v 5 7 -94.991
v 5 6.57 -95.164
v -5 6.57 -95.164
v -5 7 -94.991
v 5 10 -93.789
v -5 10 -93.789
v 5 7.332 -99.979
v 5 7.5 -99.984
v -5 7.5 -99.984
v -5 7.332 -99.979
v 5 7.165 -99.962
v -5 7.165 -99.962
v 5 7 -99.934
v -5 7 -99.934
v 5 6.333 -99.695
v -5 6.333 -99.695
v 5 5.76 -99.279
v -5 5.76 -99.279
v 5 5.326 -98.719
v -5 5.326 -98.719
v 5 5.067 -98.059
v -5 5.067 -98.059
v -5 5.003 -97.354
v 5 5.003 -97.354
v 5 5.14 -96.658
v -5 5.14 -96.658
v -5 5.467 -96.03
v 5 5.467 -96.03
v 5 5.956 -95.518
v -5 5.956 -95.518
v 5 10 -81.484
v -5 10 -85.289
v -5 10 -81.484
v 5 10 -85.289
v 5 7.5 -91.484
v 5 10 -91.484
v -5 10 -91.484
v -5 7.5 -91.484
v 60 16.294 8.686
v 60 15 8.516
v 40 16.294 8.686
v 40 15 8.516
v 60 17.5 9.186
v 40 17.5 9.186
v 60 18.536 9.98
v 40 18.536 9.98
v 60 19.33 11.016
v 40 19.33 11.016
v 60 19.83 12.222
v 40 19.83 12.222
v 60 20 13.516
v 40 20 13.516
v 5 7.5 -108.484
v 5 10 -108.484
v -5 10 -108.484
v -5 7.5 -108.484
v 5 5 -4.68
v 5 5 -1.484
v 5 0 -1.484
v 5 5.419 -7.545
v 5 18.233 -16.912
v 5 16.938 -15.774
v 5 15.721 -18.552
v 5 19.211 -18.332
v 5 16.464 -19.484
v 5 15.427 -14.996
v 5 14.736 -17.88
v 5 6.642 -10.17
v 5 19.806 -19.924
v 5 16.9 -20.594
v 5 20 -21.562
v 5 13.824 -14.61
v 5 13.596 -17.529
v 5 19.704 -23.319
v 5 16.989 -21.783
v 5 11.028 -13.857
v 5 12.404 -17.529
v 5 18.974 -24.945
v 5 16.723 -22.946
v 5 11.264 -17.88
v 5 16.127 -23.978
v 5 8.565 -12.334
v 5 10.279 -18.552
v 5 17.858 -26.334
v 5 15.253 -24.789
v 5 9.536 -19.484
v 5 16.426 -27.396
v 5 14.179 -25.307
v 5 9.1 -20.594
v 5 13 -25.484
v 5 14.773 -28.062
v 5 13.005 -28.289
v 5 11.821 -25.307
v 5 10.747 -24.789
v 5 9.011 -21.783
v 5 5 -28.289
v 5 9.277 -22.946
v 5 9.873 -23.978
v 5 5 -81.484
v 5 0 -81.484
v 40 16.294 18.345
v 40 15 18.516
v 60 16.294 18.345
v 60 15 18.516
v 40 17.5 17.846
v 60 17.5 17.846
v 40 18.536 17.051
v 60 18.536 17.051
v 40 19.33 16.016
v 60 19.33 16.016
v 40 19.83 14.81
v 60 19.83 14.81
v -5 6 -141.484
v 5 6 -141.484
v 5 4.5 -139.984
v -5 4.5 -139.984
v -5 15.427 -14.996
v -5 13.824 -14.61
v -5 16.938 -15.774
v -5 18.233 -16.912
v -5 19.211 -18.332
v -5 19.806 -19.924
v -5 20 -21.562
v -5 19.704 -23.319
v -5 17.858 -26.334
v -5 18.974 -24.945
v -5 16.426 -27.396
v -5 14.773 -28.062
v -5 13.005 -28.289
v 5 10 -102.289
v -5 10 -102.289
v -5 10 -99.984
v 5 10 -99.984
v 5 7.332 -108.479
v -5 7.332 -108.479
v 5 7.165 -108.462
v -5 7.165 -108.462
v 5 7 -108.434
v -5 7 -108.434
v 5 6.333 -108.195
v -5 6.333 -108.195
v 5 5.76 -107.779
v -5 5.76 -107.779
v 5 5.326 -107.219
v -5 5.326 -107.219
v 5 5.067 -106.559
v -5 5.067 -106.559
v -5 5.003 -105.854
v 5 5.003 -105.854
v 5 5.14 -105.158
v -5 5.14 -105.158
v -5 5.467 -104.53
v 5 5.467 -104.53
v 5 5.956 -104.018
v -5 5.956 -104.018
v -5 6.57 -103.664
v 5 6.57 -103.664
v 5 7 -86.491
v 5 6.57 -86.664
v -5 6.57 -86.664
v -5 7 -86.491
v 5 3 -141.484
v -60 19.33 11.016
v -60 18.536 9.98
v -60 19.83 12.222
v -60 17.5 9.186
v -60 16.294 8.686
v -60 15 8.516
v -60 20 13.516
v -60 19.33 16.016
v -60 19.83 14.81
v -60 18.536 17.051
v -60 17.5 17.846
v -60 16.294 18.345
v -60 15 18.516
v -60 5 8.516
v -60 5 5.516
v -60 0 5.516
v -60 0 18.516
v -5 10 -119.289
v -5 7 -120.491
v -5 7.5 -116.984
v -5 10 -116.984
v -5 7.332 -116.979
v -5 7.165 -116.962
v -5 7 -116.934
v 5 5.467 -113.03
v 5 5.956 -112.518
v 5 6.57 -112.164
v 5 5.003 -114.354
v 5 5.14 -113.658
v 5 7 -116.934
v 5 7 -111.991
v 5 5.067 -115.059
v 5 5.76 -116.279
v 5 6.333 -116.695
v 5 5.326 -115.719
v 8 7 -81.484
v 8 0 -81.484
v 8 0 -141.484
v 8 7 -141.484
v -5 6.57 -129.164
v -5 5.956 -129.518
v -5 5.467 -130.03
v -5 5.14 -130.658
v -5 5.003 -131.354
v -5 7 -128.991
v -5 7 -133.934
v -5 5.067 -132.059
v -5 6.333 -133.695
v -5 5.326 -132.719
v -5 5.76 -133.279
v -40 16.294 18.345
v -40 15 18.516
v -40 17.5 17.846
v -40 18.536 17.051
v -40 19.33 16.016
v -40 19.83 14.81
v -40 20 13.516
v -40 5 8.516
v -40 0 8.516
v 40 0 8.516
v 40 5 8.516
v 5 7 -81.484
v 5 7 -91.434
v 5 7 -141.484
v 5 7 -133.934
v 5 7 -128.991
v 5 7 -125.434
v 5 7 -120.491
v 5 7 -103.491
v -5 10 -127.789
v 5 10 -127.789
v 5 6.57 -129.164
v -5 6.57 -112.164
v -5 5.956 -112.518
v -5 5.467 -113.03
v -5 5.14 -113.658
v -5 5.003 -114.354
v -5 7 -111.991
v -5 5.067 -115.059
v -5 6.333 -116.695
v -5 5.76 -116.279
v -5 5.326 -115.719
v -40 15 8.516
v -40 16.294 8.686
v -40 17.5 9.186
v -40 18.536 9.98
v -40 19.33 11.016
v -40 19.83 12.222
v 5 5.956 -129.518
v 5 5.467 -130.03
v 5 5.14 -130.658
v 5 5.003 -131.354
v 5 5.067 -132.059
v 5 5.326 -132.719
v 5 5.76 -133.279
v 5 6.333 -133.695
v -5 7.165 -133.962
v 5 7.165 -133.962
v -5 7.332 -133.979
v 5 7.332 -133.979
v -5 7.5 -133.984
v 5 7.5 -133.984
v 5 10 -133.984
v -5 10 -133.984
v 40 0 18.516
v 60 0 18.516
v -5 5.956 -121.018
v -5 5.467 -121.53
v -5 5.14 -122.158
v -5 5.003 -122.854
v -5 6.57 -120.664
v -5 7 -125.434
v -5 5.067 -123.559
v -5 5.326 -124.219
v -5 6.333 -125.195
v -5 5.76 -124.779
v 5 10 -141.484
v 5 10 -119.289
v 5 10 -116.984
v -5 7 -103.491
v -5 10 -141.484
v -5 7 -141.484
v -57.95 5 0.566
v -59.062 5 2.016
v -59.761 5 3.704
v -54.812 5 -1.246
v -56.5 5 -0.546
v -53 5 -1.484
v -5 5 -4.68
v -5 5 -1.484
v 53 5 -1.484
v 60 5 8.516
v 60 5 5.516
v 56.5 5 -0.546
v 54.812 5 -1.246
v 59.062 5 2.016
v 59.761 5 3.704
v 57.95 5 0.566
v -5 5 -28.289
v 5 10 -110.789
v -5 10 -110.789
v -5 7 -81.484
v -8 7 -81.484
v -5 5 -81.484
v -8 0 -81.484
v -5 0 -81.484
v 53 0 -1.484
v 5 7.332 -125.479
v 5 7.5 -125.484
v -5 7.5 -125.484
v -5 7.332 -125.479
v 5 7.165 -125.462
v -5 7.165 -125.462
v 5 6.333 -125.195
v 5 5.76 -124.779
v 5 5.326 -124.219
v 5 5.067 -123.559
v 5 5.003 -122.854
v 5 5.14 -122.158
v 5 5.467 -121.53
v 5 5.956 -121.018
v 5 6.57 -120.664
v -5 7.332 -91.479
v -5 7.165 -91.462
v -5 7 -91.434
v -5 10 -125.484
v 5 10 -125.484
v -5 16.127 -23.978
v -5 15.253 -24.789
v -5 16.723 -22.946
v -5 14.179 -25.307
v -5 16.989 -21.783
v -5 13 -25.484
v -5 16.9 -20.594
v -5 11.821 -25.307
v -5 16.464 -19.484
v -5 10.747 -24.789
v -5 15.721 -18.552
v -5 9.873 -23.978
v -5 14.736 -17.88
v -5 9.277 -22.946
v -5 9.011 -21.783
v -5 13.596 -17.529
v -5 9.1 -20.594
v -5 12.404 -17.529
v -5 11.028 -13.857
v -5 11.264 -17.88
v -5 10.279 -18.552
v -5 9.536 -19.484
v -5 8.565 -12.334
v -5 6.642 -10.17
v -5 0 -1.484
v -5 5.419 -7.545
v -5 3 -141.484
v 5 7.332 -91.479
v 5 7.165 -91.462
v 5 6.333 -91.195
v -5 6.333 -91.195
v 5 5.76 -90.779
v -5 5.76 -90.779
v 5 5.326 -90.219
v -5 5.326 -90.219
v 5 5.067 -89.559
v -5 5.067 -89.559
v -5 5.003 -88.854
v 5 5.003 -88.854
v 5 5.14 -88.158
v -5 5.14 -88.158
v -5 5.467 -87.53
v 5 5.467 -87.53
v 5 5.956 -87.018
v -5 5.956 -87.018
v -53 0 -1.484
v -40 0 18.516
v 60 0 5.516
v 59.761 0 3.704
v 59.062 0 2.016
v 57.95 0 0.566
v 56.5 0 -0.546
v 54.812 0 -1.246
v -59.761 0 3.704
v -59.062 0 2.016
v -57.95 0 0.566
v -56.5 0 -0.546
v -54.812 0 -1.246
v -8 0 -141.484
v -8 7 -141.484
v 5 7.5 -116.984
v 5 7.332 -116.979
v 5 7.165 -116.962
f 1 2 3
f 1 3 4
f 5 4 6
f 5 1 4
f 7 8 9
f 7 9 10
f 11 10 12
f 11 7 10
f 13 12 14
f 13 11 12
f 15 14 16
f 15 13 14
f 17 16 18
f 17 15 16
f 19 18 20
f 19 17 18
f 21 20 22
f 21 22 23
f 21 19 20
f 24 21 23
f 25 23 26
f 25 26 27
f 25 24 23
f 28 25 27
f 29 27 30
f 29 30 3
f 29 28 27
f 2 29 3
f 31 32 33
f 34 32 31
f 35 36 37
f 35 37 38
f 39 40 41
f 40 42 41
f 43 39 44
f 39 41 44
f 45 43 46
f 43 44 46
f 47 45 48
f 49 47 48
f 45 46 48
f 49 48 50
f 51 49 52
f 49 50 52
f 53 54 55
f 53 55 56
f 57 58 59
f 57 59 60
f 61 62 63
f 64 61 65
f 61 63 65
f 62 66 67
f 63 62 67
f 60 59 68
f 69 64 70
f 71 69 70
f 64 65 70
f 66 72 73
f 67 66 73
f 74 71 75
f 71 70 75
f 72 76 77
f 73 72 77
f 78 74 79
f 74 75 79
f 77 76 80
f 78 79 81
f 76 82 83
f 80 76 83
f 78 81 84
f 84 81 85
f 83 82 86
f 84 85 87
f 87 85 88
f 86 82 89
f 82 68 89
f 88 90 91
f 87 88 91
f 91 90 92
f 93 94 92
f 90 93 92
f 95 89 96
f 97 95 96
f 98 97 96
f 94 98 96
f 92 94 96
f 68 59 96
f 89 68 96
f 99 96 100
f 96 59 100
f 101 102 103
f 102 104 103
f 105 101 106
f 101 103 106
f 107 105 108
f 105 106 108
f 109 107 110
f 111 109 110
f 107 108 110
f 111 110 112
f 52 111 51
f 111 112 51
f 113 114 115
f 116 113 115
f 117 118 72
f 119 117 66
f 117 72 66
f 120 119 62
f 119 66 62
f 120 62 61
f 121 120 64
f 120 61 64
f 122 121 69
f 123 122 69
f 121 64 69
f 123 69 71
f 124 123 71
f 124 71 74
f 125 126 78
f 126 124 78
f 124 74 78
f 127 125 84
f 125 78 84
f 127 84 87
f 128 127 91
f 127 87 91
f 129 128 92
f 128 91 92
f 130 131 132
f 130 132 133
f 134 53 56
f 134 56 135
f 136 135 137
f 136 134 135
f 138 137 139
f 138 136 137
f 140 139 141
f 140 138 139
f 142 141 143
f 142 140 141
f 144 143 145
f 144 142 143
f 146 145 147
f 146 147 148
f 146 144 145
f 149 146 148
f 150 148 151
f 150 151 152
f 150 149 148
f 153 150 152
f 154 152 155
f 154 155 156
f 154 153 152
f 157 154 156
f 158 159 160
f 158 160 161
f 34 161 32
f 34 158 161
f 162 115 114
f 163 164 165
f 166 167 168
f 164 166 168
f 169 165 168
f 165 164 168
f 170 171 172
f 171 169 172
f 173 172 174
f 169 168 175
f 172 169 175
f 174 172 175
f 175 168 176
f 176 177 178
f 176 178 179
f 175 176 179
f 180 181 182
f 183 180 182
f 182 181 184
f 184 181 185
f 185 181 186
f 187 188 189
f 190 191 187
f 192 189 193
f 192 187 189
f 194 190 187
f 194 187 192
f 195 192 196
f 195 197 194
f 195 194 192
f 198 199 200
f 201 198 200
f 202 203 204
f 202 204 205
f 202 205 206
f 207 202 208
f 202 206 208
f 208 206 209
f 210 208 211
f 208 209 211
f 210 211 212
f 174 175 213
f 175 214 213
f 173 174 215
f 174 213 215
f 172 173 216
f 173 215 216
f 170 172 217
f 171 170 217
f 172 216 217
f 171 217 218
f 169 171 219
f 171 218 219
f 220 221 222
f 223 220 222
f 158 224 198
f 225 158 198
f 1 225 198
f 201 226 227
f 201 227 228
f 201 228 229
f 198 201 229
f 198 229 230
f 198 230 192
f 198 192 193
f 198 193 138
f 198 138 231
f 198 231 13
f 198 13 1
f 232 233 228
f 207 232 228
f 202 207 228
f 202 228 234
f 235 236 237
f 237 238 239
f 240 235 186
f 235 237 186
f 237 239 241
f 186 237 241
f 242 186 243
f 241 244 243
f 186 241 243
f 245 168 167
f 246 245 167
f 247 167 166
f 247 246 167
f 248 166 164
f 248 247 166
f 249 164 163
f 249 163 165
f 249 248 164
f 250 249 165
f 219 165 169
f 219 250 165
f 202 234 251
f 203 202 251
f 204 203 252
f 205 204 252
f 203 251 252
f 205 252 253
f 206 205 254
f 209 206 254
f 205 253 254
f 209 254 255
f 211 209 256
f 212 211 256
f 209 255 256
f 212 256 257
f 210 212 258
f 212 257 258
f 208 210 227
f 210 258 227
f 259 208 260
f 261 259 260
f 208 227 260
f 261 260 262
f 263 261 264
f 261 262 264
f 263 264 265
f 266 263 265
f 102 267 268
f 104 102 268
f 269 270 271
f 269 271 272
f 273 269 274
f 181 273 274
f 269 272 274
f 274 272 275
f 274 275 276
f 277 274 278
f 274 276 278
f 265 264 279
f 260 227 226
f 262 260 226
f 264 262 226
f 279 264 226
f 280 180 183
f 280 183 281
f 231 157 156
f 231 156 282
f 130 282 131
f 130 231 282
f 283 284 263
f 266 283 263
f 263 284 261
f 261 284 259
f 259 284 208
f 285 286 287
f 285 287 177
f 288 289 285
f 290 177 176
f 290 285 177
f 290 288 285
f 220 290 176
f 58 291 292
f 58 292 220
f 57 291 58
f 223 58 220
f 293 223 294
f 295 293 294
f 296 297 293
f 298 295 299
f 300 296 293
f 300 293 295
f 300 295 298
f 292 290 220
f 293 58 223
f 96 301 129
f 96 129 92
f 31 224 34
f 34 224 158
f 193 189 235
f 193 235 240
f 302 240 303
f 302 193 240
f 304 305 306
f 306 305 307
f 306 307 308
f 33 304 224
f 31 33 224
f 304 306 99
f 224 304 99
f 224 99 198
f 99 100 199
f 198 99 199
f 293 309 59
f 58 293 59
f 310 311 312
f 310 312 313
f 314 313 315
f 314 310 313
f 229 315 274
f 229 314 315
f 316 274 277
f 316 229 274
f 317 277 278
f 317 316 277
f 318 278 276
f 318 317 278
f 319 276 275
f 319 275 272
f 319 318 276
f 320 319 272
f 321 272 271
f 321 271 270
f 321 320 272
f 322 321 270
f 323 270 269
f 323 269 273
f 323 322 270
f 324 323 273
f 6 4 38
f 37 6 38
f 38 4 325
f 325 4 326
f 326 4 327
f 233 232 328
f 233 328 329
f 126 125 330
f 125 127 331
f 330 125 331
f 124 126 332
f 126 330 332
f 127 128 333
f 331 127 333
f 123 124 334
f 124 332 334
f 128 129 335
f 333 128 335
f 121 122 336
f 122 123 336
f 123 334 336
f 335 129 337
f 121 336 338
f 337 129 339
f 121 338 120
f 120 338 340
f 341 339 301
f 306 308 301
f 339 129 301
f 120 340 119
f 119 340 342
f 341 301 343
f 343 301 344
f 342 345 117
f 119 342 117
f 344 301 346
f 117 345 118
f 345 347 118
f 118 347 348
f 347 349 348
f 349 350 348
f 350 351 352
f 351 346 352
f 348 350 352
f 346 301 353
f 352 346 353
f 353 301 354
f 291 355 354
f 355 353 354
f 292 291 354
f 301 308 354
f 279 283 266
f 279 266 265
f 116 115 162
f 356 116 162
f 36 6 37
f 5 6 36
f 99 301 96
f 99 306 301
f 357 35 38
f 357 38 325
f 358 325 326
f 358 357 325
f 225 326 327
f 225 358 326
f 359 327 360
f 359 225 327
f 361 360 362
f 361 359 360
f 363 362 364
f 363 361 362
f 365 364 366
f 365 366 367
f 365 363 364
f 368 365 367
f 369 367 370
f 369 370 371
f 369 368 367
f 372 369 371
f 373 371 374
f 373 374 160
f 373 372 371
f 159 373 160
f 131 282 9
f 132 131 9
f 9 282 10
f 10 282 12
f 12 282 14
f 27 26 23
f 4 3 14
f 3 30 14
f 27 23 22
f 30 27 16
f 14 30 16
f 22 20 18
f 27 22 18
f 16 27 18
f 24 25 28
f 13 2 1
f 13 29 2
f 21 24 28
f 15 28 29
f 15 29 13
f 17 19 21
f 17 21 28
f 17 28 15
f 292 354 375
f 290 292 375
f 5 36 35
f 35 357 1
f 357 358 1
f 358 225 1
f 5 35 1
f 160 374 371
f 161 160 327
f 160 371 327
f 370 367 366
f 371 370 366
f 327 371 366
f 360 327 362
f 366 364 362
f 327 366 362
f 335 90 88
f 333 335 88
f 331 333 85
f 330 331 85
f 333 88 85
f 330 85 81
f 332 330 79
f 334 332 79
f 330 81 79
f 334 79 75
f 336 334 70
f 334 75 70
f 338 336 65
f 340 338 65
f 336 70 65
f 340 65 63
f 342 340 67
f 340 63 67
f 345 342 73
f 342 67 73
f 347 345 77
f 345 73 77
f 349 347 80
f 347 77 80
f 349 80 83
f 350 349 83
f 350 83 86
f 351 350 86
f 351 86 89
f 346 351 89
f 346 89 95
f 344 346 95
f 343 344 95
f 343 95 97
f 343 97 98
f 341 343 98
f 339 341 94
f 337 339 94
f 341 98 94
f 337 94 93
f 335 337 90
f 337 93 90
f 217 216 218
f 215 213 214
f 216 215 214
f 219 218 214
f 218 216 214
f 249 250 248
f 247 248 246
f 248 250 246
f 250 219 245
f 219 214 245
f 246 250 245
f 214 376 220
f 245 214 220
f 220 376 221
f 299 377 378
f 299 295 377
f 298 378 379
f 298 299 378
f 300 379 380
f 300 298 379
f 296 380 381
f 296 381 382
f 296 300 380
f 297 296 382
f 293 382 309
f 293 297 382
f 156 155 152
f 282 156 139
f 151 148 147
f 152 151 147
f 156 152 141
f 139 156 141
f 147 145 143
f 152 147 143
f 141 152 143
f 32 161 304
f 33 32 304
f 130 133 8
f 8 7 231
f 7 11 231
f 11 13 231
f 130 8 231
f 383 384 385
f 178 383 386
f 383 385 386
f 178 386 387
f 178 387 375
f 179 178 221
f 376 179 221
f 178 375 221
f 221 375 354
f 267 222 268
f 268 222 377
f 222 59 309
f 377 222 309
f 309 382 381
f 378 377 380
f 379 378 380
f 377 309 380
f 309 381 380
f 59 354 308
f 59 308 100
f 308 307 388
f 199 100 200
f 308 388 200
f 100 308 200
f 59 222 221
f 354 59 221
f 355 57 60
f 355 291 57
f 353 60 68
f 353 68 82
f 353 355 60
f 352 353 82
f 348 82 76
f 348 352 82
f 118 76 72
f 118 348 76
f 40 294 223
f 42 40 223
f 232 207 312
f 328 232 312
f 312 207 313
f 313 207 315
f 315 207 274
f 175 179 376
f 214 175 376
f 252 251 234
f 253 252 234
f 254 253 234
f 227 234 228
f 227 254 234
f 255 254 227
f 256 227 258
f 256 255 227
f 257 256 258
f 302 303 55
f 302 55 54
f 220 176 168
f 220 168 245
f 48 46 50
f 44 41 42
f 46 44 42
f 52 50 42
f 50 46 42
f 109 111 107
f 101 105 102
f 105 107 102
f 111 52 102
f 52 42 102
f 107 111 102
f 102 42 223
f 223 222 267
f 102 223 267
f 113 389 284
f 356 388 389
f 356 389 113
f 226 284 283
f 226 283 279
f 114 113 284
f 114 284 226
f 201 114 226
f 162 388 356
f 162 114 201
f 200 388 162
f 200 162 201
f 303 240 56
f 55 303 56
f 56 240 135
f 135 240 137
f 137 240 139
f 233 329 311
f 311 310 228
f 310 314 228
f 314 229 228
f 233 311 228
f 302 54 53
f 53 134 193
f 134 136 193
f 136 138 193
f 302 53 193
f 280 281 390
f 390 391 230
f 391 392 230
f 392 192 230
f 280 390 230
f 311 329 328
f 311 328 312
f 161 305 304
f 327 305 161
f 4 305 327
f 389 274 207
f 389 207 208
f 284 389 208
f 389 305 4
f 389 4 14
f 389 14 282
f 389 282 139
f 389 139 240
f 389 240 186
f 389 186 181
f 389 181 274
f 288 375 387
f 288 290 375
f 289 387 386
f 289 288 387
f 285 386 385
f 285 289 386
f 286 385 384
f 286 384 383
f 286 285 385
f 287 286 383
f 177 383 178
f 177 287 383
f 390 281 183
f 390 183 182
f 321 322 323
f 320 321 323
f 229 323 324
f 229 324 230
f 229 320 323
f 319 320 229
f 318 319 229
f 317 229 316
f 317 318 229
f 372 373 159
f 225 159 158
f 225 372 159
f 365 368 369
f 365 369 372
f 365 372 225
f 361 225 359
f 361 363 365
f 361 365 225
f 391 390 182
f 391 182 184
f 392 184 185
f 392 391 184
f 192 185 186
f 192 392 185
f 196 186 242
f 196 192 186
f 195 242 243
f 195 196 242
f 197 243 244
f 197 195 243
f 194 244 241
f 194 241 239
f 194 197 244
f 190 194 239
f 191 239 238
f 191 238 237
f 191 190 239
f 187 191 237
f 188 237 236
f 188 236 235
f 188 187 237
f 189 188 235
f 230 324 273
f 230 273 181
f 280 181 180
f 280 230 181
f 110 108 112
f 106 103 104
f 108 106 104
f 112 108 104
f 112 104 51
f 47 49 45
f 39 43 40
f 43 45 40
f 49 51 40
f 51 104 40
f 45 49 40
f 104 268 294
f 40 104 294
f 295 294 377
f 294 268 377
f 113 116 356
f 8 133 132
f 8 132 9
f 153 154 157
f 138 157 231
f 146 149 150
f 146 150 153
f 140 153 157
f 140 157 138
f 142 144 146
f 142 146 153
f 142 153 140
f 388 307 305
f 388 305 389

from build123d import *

# Parameters (mm, degrees)
BOSS_EXTRUDE1_DEPTH = 5
SKETCH1_3_W         = 20
SKETCH1_3_H         = 10
SKETCH1_3_W_2       = 10
SKETCH1_3_H_2       = 13.608990902
BOSS_EXTRUDE2_DEPTH = 20
SKETCH1_5_W         = 10
SKETCH1_5_H         = 60
BOSS_EXTRUDE3_DEPTH = 10
SKETCH3_R           = 4
CUT_EXTRUDE1_DEPTH  = 10
FILLET1_R           = 10
FILLET2_R           = 5
FILLET3_R           = 7
FILLET4_R           = 7
FILLET5_R           = 7
SKETCH1_6_W         = 3
SKETCH1_6_H         = 60
BOSS_EXTRUDE4_DEPTH = 7


# Some blends are built 0.0001 mm under size
with BuildPart() as part:
    # Sketch1 → Boss-Extrude1 (new body)
    with BuildSketch(Plane(origin=(0, 0, 0), x_dir=(1, 0, 0), z_dir=(0, 1, 0))):
        Polygon((40, -8.515763432), (40, -18.515763432), (60, -18.515763432), (60, 1.484236568), (5, 1.484236568), (5, 141.484236568), (-5, 141.484236568), (-5, 1.484236568), (-60, 1.484236568), (-60, -18.515763432), (-40, -18.515763432), (-40, -8.515763432), align=None)
    extrude(amount=BOSS_EXTRUDE1_DEPTH)

    # Sketch1<3> → Boss-Extrude2 (add)
    with BuildSketch(Plane(origin=(0, 0, 0), x_dir=(1, 0, 0), z_dir=(0, 1, 0))):
        with Locations((-50, -13.515763432)):
            Rectangle(SKETCH1_3_W, SKETCH1_3_H)
        Polygon((60, -8.515763432), (44.667493795, -8.515763432), (40, -8.515763432), (40, -18.515763432), (60, -18.515763432), align=None)
        with Locations((0, 21.484236568)):
            Rectangle(SKETCH1_3_W_2, SKETCH1_3_H_2)
    extrude(amount=BOSS_EXTRUDE2_DEPTH)

    # Sketch1<5> → Boss-Extrude3 (add)
    with BuildSketch(Plane(origin=(0, 0, 0), x_dir=(1, 0, 0), z_dir=(0, 1, 0))):
        with Locations((0, 111.484236568)):
            Rectangle(SKETCH1_5_W, SKETCH1_5_H)
    extrude(amount=BOSS_EXTRUDE3_DEPTH)

    # Sketch3 → Cut-Extrude1 (cut)
    with BuildSketch(Plane(origin=(5, 0, 0), x_dir=(0, 0, -1), z_dir=(1, 0, 0))):
        with Locations((21.484236568, 13)):
            Circle(SKETCH3_R)
        with BuildLine():
            Line((120.663634314, 6.570050981), (119.289130035, 10))
            Line((119.289130035, 10), (125.484236568, 10))
            Line((125.484236568, 10), (125.484236568, 7.5))
            ThreePointArc((125.484236568, 7.5), (123.457784012, 5.045259114), (120.663634314, 6.570050981))
        make_face()
        with BuildLine():
            Line((133.984236568, 7.5), (133.984236568, 10))
            Line((133.984236568, 10), (127.789130035, 10))
            Line((127.789130035, 10), (129.163634314, 6.570050981))
            ThreePointArc((129.163634314, 6.570050981), (131.957784012, 5.045259114), (133.984236568, 7.5))
        make_face()
        Polygon((141.484236568, 6), (139.984236568, 4.5), (141.484236568, 3), align=None)
        with BuildLine():
            Line((112.163634314, 6.570050981), (110.789130035, 10))
            Line((110.789130035, 10), (116.984236568, 10))
            Line((116.984236568, 10), (116.984236568, 7.5))
            ThreePointArc((116.984236568, 7.5), (114.957784012, 5.045259114), (112.163634314, 6.570050981))
        make_face()
        with BuildLine():
            Line((103.663634314, 6.570050981), (102.289130035, 10))
            Line((102.289130035, 10), (108.484236568, 10))
            Line((108.484236568, 10), (108.484236568, 7.5))
            ThreePointArc((108.484236568, 7.5), (106.457784012, 5.045259114), (103.663634314, 6.570050981))
        make_face()
        with BuildLine():
            Line((95.163634314, 6.570050981), (93.789130035, 10))
            Line((93.789130035, 10), (99.984236568, 10))
            Line((99.984236568, 10), (99.984236568, 7.5))
            ThreePointArc((99.984236568, 7.5), (97.957784012, 5.045259114), (95.163634314, 6.570050981))
        make_face()
        with BuildLine():
            Line((86.663634314, 6.570050981), (85.289130035, 10))
            Line((85.289130035, 10), (91.484236568, 10))
            Line((91.484236568, 10), (91.484236568, 7.5))
            ThreePointArc((91.484236568, 7.5), (89.457784012, 5.045259114), (86.663634314, 6.570050981))
        make_face()
    extrude(amount=-CUT_EXTRUDE1_DEPTH, mode=Mode.SUBTRACT)

    # Fillet1
    fillet1_edges = [part.edges().sort_by_distance(p)[0] for p in [
        (0, 5, -14.679741117),
    ]]
    fillet(fillet1_edges, radius=FILLET1_R)

    # Fillet2
    fillet2_edges = [part.edges().sort_by_distance(p)[0] for p in [
        (-50, 20, 8.515763432),
        (-50, 20, 18.515763432),
        (50, 20, 8.515763432),
        (50, 20, 18.515763432),
    ]]
    fillet(fillet2_edges, radius=FILLET2_R - 0.0001)  # a hair under: the kernel refuses the full size

    # Fillet3
    fillet3_edges = [part.edges().sort_by_distance(p)[0] for p in [
        (0, 20, -14.679741117),
    ]]
    fillet(fillet3_edges, radius=FILLET3_R)

    # Fillet4
    # the kernel refuses this fillet: 7 mm, written as the material it takes off along each edge
    with BuildSketch(Plane(origin=(22.486690858, 20, -28.288732019), x_dir=(0, 0, 1), z_dir=(-1, 0, 0))) as fillet4_piece_1:
        with BuildLine():
            CenterArc((7, -6.994676343), FILLET4_R, 92.234709992, 87.765290008)
            Line((0, -6.994676343), (-0.14, -6.994676343))
            Line((-0.14, -6.994676343), (-0.14, 0))
            Line((-0.14, 0), (0, 0.14))
            ThreePointArc((0, 0.14), (3.363523943, 0.14), (6.721588844, 0.139893527))
            Line((6.721588844, 0.139893527), (6.727047886, 0))
        make_face()
    extrude(amount=44.973381715, mode=Mode.SUBTRACT)

    # Fillet5
    fillet5_edges = [part.edges().sort_by_distance(p)[0] for p in [
        (-60, 2.5, -1.484236568),
        (60, 2.5, -1.484236568),
    ]]
    fillet(fillet5_edges, radius=FILLET5_R)

    # Sketch1<6> → Boss-Extrude4 (add)
    with BuildSketch(Plane(origin=(0, 0, 0), x_dir=(1, 0, 0), z_dir=(0, 1, 0))):
        with Locations((-6.5, 111.484236568)):
            Rectangle(SKETCH1_6_W, SKETCH1_6_H)
        with Locations((6.5, 111.484236568)):
            Rectangle(SKETCH1_6_W, SKETCH1_6_H)
    extrude(amount=BOSS_EXTRUDE4_DEPTH)


solid = part.part
